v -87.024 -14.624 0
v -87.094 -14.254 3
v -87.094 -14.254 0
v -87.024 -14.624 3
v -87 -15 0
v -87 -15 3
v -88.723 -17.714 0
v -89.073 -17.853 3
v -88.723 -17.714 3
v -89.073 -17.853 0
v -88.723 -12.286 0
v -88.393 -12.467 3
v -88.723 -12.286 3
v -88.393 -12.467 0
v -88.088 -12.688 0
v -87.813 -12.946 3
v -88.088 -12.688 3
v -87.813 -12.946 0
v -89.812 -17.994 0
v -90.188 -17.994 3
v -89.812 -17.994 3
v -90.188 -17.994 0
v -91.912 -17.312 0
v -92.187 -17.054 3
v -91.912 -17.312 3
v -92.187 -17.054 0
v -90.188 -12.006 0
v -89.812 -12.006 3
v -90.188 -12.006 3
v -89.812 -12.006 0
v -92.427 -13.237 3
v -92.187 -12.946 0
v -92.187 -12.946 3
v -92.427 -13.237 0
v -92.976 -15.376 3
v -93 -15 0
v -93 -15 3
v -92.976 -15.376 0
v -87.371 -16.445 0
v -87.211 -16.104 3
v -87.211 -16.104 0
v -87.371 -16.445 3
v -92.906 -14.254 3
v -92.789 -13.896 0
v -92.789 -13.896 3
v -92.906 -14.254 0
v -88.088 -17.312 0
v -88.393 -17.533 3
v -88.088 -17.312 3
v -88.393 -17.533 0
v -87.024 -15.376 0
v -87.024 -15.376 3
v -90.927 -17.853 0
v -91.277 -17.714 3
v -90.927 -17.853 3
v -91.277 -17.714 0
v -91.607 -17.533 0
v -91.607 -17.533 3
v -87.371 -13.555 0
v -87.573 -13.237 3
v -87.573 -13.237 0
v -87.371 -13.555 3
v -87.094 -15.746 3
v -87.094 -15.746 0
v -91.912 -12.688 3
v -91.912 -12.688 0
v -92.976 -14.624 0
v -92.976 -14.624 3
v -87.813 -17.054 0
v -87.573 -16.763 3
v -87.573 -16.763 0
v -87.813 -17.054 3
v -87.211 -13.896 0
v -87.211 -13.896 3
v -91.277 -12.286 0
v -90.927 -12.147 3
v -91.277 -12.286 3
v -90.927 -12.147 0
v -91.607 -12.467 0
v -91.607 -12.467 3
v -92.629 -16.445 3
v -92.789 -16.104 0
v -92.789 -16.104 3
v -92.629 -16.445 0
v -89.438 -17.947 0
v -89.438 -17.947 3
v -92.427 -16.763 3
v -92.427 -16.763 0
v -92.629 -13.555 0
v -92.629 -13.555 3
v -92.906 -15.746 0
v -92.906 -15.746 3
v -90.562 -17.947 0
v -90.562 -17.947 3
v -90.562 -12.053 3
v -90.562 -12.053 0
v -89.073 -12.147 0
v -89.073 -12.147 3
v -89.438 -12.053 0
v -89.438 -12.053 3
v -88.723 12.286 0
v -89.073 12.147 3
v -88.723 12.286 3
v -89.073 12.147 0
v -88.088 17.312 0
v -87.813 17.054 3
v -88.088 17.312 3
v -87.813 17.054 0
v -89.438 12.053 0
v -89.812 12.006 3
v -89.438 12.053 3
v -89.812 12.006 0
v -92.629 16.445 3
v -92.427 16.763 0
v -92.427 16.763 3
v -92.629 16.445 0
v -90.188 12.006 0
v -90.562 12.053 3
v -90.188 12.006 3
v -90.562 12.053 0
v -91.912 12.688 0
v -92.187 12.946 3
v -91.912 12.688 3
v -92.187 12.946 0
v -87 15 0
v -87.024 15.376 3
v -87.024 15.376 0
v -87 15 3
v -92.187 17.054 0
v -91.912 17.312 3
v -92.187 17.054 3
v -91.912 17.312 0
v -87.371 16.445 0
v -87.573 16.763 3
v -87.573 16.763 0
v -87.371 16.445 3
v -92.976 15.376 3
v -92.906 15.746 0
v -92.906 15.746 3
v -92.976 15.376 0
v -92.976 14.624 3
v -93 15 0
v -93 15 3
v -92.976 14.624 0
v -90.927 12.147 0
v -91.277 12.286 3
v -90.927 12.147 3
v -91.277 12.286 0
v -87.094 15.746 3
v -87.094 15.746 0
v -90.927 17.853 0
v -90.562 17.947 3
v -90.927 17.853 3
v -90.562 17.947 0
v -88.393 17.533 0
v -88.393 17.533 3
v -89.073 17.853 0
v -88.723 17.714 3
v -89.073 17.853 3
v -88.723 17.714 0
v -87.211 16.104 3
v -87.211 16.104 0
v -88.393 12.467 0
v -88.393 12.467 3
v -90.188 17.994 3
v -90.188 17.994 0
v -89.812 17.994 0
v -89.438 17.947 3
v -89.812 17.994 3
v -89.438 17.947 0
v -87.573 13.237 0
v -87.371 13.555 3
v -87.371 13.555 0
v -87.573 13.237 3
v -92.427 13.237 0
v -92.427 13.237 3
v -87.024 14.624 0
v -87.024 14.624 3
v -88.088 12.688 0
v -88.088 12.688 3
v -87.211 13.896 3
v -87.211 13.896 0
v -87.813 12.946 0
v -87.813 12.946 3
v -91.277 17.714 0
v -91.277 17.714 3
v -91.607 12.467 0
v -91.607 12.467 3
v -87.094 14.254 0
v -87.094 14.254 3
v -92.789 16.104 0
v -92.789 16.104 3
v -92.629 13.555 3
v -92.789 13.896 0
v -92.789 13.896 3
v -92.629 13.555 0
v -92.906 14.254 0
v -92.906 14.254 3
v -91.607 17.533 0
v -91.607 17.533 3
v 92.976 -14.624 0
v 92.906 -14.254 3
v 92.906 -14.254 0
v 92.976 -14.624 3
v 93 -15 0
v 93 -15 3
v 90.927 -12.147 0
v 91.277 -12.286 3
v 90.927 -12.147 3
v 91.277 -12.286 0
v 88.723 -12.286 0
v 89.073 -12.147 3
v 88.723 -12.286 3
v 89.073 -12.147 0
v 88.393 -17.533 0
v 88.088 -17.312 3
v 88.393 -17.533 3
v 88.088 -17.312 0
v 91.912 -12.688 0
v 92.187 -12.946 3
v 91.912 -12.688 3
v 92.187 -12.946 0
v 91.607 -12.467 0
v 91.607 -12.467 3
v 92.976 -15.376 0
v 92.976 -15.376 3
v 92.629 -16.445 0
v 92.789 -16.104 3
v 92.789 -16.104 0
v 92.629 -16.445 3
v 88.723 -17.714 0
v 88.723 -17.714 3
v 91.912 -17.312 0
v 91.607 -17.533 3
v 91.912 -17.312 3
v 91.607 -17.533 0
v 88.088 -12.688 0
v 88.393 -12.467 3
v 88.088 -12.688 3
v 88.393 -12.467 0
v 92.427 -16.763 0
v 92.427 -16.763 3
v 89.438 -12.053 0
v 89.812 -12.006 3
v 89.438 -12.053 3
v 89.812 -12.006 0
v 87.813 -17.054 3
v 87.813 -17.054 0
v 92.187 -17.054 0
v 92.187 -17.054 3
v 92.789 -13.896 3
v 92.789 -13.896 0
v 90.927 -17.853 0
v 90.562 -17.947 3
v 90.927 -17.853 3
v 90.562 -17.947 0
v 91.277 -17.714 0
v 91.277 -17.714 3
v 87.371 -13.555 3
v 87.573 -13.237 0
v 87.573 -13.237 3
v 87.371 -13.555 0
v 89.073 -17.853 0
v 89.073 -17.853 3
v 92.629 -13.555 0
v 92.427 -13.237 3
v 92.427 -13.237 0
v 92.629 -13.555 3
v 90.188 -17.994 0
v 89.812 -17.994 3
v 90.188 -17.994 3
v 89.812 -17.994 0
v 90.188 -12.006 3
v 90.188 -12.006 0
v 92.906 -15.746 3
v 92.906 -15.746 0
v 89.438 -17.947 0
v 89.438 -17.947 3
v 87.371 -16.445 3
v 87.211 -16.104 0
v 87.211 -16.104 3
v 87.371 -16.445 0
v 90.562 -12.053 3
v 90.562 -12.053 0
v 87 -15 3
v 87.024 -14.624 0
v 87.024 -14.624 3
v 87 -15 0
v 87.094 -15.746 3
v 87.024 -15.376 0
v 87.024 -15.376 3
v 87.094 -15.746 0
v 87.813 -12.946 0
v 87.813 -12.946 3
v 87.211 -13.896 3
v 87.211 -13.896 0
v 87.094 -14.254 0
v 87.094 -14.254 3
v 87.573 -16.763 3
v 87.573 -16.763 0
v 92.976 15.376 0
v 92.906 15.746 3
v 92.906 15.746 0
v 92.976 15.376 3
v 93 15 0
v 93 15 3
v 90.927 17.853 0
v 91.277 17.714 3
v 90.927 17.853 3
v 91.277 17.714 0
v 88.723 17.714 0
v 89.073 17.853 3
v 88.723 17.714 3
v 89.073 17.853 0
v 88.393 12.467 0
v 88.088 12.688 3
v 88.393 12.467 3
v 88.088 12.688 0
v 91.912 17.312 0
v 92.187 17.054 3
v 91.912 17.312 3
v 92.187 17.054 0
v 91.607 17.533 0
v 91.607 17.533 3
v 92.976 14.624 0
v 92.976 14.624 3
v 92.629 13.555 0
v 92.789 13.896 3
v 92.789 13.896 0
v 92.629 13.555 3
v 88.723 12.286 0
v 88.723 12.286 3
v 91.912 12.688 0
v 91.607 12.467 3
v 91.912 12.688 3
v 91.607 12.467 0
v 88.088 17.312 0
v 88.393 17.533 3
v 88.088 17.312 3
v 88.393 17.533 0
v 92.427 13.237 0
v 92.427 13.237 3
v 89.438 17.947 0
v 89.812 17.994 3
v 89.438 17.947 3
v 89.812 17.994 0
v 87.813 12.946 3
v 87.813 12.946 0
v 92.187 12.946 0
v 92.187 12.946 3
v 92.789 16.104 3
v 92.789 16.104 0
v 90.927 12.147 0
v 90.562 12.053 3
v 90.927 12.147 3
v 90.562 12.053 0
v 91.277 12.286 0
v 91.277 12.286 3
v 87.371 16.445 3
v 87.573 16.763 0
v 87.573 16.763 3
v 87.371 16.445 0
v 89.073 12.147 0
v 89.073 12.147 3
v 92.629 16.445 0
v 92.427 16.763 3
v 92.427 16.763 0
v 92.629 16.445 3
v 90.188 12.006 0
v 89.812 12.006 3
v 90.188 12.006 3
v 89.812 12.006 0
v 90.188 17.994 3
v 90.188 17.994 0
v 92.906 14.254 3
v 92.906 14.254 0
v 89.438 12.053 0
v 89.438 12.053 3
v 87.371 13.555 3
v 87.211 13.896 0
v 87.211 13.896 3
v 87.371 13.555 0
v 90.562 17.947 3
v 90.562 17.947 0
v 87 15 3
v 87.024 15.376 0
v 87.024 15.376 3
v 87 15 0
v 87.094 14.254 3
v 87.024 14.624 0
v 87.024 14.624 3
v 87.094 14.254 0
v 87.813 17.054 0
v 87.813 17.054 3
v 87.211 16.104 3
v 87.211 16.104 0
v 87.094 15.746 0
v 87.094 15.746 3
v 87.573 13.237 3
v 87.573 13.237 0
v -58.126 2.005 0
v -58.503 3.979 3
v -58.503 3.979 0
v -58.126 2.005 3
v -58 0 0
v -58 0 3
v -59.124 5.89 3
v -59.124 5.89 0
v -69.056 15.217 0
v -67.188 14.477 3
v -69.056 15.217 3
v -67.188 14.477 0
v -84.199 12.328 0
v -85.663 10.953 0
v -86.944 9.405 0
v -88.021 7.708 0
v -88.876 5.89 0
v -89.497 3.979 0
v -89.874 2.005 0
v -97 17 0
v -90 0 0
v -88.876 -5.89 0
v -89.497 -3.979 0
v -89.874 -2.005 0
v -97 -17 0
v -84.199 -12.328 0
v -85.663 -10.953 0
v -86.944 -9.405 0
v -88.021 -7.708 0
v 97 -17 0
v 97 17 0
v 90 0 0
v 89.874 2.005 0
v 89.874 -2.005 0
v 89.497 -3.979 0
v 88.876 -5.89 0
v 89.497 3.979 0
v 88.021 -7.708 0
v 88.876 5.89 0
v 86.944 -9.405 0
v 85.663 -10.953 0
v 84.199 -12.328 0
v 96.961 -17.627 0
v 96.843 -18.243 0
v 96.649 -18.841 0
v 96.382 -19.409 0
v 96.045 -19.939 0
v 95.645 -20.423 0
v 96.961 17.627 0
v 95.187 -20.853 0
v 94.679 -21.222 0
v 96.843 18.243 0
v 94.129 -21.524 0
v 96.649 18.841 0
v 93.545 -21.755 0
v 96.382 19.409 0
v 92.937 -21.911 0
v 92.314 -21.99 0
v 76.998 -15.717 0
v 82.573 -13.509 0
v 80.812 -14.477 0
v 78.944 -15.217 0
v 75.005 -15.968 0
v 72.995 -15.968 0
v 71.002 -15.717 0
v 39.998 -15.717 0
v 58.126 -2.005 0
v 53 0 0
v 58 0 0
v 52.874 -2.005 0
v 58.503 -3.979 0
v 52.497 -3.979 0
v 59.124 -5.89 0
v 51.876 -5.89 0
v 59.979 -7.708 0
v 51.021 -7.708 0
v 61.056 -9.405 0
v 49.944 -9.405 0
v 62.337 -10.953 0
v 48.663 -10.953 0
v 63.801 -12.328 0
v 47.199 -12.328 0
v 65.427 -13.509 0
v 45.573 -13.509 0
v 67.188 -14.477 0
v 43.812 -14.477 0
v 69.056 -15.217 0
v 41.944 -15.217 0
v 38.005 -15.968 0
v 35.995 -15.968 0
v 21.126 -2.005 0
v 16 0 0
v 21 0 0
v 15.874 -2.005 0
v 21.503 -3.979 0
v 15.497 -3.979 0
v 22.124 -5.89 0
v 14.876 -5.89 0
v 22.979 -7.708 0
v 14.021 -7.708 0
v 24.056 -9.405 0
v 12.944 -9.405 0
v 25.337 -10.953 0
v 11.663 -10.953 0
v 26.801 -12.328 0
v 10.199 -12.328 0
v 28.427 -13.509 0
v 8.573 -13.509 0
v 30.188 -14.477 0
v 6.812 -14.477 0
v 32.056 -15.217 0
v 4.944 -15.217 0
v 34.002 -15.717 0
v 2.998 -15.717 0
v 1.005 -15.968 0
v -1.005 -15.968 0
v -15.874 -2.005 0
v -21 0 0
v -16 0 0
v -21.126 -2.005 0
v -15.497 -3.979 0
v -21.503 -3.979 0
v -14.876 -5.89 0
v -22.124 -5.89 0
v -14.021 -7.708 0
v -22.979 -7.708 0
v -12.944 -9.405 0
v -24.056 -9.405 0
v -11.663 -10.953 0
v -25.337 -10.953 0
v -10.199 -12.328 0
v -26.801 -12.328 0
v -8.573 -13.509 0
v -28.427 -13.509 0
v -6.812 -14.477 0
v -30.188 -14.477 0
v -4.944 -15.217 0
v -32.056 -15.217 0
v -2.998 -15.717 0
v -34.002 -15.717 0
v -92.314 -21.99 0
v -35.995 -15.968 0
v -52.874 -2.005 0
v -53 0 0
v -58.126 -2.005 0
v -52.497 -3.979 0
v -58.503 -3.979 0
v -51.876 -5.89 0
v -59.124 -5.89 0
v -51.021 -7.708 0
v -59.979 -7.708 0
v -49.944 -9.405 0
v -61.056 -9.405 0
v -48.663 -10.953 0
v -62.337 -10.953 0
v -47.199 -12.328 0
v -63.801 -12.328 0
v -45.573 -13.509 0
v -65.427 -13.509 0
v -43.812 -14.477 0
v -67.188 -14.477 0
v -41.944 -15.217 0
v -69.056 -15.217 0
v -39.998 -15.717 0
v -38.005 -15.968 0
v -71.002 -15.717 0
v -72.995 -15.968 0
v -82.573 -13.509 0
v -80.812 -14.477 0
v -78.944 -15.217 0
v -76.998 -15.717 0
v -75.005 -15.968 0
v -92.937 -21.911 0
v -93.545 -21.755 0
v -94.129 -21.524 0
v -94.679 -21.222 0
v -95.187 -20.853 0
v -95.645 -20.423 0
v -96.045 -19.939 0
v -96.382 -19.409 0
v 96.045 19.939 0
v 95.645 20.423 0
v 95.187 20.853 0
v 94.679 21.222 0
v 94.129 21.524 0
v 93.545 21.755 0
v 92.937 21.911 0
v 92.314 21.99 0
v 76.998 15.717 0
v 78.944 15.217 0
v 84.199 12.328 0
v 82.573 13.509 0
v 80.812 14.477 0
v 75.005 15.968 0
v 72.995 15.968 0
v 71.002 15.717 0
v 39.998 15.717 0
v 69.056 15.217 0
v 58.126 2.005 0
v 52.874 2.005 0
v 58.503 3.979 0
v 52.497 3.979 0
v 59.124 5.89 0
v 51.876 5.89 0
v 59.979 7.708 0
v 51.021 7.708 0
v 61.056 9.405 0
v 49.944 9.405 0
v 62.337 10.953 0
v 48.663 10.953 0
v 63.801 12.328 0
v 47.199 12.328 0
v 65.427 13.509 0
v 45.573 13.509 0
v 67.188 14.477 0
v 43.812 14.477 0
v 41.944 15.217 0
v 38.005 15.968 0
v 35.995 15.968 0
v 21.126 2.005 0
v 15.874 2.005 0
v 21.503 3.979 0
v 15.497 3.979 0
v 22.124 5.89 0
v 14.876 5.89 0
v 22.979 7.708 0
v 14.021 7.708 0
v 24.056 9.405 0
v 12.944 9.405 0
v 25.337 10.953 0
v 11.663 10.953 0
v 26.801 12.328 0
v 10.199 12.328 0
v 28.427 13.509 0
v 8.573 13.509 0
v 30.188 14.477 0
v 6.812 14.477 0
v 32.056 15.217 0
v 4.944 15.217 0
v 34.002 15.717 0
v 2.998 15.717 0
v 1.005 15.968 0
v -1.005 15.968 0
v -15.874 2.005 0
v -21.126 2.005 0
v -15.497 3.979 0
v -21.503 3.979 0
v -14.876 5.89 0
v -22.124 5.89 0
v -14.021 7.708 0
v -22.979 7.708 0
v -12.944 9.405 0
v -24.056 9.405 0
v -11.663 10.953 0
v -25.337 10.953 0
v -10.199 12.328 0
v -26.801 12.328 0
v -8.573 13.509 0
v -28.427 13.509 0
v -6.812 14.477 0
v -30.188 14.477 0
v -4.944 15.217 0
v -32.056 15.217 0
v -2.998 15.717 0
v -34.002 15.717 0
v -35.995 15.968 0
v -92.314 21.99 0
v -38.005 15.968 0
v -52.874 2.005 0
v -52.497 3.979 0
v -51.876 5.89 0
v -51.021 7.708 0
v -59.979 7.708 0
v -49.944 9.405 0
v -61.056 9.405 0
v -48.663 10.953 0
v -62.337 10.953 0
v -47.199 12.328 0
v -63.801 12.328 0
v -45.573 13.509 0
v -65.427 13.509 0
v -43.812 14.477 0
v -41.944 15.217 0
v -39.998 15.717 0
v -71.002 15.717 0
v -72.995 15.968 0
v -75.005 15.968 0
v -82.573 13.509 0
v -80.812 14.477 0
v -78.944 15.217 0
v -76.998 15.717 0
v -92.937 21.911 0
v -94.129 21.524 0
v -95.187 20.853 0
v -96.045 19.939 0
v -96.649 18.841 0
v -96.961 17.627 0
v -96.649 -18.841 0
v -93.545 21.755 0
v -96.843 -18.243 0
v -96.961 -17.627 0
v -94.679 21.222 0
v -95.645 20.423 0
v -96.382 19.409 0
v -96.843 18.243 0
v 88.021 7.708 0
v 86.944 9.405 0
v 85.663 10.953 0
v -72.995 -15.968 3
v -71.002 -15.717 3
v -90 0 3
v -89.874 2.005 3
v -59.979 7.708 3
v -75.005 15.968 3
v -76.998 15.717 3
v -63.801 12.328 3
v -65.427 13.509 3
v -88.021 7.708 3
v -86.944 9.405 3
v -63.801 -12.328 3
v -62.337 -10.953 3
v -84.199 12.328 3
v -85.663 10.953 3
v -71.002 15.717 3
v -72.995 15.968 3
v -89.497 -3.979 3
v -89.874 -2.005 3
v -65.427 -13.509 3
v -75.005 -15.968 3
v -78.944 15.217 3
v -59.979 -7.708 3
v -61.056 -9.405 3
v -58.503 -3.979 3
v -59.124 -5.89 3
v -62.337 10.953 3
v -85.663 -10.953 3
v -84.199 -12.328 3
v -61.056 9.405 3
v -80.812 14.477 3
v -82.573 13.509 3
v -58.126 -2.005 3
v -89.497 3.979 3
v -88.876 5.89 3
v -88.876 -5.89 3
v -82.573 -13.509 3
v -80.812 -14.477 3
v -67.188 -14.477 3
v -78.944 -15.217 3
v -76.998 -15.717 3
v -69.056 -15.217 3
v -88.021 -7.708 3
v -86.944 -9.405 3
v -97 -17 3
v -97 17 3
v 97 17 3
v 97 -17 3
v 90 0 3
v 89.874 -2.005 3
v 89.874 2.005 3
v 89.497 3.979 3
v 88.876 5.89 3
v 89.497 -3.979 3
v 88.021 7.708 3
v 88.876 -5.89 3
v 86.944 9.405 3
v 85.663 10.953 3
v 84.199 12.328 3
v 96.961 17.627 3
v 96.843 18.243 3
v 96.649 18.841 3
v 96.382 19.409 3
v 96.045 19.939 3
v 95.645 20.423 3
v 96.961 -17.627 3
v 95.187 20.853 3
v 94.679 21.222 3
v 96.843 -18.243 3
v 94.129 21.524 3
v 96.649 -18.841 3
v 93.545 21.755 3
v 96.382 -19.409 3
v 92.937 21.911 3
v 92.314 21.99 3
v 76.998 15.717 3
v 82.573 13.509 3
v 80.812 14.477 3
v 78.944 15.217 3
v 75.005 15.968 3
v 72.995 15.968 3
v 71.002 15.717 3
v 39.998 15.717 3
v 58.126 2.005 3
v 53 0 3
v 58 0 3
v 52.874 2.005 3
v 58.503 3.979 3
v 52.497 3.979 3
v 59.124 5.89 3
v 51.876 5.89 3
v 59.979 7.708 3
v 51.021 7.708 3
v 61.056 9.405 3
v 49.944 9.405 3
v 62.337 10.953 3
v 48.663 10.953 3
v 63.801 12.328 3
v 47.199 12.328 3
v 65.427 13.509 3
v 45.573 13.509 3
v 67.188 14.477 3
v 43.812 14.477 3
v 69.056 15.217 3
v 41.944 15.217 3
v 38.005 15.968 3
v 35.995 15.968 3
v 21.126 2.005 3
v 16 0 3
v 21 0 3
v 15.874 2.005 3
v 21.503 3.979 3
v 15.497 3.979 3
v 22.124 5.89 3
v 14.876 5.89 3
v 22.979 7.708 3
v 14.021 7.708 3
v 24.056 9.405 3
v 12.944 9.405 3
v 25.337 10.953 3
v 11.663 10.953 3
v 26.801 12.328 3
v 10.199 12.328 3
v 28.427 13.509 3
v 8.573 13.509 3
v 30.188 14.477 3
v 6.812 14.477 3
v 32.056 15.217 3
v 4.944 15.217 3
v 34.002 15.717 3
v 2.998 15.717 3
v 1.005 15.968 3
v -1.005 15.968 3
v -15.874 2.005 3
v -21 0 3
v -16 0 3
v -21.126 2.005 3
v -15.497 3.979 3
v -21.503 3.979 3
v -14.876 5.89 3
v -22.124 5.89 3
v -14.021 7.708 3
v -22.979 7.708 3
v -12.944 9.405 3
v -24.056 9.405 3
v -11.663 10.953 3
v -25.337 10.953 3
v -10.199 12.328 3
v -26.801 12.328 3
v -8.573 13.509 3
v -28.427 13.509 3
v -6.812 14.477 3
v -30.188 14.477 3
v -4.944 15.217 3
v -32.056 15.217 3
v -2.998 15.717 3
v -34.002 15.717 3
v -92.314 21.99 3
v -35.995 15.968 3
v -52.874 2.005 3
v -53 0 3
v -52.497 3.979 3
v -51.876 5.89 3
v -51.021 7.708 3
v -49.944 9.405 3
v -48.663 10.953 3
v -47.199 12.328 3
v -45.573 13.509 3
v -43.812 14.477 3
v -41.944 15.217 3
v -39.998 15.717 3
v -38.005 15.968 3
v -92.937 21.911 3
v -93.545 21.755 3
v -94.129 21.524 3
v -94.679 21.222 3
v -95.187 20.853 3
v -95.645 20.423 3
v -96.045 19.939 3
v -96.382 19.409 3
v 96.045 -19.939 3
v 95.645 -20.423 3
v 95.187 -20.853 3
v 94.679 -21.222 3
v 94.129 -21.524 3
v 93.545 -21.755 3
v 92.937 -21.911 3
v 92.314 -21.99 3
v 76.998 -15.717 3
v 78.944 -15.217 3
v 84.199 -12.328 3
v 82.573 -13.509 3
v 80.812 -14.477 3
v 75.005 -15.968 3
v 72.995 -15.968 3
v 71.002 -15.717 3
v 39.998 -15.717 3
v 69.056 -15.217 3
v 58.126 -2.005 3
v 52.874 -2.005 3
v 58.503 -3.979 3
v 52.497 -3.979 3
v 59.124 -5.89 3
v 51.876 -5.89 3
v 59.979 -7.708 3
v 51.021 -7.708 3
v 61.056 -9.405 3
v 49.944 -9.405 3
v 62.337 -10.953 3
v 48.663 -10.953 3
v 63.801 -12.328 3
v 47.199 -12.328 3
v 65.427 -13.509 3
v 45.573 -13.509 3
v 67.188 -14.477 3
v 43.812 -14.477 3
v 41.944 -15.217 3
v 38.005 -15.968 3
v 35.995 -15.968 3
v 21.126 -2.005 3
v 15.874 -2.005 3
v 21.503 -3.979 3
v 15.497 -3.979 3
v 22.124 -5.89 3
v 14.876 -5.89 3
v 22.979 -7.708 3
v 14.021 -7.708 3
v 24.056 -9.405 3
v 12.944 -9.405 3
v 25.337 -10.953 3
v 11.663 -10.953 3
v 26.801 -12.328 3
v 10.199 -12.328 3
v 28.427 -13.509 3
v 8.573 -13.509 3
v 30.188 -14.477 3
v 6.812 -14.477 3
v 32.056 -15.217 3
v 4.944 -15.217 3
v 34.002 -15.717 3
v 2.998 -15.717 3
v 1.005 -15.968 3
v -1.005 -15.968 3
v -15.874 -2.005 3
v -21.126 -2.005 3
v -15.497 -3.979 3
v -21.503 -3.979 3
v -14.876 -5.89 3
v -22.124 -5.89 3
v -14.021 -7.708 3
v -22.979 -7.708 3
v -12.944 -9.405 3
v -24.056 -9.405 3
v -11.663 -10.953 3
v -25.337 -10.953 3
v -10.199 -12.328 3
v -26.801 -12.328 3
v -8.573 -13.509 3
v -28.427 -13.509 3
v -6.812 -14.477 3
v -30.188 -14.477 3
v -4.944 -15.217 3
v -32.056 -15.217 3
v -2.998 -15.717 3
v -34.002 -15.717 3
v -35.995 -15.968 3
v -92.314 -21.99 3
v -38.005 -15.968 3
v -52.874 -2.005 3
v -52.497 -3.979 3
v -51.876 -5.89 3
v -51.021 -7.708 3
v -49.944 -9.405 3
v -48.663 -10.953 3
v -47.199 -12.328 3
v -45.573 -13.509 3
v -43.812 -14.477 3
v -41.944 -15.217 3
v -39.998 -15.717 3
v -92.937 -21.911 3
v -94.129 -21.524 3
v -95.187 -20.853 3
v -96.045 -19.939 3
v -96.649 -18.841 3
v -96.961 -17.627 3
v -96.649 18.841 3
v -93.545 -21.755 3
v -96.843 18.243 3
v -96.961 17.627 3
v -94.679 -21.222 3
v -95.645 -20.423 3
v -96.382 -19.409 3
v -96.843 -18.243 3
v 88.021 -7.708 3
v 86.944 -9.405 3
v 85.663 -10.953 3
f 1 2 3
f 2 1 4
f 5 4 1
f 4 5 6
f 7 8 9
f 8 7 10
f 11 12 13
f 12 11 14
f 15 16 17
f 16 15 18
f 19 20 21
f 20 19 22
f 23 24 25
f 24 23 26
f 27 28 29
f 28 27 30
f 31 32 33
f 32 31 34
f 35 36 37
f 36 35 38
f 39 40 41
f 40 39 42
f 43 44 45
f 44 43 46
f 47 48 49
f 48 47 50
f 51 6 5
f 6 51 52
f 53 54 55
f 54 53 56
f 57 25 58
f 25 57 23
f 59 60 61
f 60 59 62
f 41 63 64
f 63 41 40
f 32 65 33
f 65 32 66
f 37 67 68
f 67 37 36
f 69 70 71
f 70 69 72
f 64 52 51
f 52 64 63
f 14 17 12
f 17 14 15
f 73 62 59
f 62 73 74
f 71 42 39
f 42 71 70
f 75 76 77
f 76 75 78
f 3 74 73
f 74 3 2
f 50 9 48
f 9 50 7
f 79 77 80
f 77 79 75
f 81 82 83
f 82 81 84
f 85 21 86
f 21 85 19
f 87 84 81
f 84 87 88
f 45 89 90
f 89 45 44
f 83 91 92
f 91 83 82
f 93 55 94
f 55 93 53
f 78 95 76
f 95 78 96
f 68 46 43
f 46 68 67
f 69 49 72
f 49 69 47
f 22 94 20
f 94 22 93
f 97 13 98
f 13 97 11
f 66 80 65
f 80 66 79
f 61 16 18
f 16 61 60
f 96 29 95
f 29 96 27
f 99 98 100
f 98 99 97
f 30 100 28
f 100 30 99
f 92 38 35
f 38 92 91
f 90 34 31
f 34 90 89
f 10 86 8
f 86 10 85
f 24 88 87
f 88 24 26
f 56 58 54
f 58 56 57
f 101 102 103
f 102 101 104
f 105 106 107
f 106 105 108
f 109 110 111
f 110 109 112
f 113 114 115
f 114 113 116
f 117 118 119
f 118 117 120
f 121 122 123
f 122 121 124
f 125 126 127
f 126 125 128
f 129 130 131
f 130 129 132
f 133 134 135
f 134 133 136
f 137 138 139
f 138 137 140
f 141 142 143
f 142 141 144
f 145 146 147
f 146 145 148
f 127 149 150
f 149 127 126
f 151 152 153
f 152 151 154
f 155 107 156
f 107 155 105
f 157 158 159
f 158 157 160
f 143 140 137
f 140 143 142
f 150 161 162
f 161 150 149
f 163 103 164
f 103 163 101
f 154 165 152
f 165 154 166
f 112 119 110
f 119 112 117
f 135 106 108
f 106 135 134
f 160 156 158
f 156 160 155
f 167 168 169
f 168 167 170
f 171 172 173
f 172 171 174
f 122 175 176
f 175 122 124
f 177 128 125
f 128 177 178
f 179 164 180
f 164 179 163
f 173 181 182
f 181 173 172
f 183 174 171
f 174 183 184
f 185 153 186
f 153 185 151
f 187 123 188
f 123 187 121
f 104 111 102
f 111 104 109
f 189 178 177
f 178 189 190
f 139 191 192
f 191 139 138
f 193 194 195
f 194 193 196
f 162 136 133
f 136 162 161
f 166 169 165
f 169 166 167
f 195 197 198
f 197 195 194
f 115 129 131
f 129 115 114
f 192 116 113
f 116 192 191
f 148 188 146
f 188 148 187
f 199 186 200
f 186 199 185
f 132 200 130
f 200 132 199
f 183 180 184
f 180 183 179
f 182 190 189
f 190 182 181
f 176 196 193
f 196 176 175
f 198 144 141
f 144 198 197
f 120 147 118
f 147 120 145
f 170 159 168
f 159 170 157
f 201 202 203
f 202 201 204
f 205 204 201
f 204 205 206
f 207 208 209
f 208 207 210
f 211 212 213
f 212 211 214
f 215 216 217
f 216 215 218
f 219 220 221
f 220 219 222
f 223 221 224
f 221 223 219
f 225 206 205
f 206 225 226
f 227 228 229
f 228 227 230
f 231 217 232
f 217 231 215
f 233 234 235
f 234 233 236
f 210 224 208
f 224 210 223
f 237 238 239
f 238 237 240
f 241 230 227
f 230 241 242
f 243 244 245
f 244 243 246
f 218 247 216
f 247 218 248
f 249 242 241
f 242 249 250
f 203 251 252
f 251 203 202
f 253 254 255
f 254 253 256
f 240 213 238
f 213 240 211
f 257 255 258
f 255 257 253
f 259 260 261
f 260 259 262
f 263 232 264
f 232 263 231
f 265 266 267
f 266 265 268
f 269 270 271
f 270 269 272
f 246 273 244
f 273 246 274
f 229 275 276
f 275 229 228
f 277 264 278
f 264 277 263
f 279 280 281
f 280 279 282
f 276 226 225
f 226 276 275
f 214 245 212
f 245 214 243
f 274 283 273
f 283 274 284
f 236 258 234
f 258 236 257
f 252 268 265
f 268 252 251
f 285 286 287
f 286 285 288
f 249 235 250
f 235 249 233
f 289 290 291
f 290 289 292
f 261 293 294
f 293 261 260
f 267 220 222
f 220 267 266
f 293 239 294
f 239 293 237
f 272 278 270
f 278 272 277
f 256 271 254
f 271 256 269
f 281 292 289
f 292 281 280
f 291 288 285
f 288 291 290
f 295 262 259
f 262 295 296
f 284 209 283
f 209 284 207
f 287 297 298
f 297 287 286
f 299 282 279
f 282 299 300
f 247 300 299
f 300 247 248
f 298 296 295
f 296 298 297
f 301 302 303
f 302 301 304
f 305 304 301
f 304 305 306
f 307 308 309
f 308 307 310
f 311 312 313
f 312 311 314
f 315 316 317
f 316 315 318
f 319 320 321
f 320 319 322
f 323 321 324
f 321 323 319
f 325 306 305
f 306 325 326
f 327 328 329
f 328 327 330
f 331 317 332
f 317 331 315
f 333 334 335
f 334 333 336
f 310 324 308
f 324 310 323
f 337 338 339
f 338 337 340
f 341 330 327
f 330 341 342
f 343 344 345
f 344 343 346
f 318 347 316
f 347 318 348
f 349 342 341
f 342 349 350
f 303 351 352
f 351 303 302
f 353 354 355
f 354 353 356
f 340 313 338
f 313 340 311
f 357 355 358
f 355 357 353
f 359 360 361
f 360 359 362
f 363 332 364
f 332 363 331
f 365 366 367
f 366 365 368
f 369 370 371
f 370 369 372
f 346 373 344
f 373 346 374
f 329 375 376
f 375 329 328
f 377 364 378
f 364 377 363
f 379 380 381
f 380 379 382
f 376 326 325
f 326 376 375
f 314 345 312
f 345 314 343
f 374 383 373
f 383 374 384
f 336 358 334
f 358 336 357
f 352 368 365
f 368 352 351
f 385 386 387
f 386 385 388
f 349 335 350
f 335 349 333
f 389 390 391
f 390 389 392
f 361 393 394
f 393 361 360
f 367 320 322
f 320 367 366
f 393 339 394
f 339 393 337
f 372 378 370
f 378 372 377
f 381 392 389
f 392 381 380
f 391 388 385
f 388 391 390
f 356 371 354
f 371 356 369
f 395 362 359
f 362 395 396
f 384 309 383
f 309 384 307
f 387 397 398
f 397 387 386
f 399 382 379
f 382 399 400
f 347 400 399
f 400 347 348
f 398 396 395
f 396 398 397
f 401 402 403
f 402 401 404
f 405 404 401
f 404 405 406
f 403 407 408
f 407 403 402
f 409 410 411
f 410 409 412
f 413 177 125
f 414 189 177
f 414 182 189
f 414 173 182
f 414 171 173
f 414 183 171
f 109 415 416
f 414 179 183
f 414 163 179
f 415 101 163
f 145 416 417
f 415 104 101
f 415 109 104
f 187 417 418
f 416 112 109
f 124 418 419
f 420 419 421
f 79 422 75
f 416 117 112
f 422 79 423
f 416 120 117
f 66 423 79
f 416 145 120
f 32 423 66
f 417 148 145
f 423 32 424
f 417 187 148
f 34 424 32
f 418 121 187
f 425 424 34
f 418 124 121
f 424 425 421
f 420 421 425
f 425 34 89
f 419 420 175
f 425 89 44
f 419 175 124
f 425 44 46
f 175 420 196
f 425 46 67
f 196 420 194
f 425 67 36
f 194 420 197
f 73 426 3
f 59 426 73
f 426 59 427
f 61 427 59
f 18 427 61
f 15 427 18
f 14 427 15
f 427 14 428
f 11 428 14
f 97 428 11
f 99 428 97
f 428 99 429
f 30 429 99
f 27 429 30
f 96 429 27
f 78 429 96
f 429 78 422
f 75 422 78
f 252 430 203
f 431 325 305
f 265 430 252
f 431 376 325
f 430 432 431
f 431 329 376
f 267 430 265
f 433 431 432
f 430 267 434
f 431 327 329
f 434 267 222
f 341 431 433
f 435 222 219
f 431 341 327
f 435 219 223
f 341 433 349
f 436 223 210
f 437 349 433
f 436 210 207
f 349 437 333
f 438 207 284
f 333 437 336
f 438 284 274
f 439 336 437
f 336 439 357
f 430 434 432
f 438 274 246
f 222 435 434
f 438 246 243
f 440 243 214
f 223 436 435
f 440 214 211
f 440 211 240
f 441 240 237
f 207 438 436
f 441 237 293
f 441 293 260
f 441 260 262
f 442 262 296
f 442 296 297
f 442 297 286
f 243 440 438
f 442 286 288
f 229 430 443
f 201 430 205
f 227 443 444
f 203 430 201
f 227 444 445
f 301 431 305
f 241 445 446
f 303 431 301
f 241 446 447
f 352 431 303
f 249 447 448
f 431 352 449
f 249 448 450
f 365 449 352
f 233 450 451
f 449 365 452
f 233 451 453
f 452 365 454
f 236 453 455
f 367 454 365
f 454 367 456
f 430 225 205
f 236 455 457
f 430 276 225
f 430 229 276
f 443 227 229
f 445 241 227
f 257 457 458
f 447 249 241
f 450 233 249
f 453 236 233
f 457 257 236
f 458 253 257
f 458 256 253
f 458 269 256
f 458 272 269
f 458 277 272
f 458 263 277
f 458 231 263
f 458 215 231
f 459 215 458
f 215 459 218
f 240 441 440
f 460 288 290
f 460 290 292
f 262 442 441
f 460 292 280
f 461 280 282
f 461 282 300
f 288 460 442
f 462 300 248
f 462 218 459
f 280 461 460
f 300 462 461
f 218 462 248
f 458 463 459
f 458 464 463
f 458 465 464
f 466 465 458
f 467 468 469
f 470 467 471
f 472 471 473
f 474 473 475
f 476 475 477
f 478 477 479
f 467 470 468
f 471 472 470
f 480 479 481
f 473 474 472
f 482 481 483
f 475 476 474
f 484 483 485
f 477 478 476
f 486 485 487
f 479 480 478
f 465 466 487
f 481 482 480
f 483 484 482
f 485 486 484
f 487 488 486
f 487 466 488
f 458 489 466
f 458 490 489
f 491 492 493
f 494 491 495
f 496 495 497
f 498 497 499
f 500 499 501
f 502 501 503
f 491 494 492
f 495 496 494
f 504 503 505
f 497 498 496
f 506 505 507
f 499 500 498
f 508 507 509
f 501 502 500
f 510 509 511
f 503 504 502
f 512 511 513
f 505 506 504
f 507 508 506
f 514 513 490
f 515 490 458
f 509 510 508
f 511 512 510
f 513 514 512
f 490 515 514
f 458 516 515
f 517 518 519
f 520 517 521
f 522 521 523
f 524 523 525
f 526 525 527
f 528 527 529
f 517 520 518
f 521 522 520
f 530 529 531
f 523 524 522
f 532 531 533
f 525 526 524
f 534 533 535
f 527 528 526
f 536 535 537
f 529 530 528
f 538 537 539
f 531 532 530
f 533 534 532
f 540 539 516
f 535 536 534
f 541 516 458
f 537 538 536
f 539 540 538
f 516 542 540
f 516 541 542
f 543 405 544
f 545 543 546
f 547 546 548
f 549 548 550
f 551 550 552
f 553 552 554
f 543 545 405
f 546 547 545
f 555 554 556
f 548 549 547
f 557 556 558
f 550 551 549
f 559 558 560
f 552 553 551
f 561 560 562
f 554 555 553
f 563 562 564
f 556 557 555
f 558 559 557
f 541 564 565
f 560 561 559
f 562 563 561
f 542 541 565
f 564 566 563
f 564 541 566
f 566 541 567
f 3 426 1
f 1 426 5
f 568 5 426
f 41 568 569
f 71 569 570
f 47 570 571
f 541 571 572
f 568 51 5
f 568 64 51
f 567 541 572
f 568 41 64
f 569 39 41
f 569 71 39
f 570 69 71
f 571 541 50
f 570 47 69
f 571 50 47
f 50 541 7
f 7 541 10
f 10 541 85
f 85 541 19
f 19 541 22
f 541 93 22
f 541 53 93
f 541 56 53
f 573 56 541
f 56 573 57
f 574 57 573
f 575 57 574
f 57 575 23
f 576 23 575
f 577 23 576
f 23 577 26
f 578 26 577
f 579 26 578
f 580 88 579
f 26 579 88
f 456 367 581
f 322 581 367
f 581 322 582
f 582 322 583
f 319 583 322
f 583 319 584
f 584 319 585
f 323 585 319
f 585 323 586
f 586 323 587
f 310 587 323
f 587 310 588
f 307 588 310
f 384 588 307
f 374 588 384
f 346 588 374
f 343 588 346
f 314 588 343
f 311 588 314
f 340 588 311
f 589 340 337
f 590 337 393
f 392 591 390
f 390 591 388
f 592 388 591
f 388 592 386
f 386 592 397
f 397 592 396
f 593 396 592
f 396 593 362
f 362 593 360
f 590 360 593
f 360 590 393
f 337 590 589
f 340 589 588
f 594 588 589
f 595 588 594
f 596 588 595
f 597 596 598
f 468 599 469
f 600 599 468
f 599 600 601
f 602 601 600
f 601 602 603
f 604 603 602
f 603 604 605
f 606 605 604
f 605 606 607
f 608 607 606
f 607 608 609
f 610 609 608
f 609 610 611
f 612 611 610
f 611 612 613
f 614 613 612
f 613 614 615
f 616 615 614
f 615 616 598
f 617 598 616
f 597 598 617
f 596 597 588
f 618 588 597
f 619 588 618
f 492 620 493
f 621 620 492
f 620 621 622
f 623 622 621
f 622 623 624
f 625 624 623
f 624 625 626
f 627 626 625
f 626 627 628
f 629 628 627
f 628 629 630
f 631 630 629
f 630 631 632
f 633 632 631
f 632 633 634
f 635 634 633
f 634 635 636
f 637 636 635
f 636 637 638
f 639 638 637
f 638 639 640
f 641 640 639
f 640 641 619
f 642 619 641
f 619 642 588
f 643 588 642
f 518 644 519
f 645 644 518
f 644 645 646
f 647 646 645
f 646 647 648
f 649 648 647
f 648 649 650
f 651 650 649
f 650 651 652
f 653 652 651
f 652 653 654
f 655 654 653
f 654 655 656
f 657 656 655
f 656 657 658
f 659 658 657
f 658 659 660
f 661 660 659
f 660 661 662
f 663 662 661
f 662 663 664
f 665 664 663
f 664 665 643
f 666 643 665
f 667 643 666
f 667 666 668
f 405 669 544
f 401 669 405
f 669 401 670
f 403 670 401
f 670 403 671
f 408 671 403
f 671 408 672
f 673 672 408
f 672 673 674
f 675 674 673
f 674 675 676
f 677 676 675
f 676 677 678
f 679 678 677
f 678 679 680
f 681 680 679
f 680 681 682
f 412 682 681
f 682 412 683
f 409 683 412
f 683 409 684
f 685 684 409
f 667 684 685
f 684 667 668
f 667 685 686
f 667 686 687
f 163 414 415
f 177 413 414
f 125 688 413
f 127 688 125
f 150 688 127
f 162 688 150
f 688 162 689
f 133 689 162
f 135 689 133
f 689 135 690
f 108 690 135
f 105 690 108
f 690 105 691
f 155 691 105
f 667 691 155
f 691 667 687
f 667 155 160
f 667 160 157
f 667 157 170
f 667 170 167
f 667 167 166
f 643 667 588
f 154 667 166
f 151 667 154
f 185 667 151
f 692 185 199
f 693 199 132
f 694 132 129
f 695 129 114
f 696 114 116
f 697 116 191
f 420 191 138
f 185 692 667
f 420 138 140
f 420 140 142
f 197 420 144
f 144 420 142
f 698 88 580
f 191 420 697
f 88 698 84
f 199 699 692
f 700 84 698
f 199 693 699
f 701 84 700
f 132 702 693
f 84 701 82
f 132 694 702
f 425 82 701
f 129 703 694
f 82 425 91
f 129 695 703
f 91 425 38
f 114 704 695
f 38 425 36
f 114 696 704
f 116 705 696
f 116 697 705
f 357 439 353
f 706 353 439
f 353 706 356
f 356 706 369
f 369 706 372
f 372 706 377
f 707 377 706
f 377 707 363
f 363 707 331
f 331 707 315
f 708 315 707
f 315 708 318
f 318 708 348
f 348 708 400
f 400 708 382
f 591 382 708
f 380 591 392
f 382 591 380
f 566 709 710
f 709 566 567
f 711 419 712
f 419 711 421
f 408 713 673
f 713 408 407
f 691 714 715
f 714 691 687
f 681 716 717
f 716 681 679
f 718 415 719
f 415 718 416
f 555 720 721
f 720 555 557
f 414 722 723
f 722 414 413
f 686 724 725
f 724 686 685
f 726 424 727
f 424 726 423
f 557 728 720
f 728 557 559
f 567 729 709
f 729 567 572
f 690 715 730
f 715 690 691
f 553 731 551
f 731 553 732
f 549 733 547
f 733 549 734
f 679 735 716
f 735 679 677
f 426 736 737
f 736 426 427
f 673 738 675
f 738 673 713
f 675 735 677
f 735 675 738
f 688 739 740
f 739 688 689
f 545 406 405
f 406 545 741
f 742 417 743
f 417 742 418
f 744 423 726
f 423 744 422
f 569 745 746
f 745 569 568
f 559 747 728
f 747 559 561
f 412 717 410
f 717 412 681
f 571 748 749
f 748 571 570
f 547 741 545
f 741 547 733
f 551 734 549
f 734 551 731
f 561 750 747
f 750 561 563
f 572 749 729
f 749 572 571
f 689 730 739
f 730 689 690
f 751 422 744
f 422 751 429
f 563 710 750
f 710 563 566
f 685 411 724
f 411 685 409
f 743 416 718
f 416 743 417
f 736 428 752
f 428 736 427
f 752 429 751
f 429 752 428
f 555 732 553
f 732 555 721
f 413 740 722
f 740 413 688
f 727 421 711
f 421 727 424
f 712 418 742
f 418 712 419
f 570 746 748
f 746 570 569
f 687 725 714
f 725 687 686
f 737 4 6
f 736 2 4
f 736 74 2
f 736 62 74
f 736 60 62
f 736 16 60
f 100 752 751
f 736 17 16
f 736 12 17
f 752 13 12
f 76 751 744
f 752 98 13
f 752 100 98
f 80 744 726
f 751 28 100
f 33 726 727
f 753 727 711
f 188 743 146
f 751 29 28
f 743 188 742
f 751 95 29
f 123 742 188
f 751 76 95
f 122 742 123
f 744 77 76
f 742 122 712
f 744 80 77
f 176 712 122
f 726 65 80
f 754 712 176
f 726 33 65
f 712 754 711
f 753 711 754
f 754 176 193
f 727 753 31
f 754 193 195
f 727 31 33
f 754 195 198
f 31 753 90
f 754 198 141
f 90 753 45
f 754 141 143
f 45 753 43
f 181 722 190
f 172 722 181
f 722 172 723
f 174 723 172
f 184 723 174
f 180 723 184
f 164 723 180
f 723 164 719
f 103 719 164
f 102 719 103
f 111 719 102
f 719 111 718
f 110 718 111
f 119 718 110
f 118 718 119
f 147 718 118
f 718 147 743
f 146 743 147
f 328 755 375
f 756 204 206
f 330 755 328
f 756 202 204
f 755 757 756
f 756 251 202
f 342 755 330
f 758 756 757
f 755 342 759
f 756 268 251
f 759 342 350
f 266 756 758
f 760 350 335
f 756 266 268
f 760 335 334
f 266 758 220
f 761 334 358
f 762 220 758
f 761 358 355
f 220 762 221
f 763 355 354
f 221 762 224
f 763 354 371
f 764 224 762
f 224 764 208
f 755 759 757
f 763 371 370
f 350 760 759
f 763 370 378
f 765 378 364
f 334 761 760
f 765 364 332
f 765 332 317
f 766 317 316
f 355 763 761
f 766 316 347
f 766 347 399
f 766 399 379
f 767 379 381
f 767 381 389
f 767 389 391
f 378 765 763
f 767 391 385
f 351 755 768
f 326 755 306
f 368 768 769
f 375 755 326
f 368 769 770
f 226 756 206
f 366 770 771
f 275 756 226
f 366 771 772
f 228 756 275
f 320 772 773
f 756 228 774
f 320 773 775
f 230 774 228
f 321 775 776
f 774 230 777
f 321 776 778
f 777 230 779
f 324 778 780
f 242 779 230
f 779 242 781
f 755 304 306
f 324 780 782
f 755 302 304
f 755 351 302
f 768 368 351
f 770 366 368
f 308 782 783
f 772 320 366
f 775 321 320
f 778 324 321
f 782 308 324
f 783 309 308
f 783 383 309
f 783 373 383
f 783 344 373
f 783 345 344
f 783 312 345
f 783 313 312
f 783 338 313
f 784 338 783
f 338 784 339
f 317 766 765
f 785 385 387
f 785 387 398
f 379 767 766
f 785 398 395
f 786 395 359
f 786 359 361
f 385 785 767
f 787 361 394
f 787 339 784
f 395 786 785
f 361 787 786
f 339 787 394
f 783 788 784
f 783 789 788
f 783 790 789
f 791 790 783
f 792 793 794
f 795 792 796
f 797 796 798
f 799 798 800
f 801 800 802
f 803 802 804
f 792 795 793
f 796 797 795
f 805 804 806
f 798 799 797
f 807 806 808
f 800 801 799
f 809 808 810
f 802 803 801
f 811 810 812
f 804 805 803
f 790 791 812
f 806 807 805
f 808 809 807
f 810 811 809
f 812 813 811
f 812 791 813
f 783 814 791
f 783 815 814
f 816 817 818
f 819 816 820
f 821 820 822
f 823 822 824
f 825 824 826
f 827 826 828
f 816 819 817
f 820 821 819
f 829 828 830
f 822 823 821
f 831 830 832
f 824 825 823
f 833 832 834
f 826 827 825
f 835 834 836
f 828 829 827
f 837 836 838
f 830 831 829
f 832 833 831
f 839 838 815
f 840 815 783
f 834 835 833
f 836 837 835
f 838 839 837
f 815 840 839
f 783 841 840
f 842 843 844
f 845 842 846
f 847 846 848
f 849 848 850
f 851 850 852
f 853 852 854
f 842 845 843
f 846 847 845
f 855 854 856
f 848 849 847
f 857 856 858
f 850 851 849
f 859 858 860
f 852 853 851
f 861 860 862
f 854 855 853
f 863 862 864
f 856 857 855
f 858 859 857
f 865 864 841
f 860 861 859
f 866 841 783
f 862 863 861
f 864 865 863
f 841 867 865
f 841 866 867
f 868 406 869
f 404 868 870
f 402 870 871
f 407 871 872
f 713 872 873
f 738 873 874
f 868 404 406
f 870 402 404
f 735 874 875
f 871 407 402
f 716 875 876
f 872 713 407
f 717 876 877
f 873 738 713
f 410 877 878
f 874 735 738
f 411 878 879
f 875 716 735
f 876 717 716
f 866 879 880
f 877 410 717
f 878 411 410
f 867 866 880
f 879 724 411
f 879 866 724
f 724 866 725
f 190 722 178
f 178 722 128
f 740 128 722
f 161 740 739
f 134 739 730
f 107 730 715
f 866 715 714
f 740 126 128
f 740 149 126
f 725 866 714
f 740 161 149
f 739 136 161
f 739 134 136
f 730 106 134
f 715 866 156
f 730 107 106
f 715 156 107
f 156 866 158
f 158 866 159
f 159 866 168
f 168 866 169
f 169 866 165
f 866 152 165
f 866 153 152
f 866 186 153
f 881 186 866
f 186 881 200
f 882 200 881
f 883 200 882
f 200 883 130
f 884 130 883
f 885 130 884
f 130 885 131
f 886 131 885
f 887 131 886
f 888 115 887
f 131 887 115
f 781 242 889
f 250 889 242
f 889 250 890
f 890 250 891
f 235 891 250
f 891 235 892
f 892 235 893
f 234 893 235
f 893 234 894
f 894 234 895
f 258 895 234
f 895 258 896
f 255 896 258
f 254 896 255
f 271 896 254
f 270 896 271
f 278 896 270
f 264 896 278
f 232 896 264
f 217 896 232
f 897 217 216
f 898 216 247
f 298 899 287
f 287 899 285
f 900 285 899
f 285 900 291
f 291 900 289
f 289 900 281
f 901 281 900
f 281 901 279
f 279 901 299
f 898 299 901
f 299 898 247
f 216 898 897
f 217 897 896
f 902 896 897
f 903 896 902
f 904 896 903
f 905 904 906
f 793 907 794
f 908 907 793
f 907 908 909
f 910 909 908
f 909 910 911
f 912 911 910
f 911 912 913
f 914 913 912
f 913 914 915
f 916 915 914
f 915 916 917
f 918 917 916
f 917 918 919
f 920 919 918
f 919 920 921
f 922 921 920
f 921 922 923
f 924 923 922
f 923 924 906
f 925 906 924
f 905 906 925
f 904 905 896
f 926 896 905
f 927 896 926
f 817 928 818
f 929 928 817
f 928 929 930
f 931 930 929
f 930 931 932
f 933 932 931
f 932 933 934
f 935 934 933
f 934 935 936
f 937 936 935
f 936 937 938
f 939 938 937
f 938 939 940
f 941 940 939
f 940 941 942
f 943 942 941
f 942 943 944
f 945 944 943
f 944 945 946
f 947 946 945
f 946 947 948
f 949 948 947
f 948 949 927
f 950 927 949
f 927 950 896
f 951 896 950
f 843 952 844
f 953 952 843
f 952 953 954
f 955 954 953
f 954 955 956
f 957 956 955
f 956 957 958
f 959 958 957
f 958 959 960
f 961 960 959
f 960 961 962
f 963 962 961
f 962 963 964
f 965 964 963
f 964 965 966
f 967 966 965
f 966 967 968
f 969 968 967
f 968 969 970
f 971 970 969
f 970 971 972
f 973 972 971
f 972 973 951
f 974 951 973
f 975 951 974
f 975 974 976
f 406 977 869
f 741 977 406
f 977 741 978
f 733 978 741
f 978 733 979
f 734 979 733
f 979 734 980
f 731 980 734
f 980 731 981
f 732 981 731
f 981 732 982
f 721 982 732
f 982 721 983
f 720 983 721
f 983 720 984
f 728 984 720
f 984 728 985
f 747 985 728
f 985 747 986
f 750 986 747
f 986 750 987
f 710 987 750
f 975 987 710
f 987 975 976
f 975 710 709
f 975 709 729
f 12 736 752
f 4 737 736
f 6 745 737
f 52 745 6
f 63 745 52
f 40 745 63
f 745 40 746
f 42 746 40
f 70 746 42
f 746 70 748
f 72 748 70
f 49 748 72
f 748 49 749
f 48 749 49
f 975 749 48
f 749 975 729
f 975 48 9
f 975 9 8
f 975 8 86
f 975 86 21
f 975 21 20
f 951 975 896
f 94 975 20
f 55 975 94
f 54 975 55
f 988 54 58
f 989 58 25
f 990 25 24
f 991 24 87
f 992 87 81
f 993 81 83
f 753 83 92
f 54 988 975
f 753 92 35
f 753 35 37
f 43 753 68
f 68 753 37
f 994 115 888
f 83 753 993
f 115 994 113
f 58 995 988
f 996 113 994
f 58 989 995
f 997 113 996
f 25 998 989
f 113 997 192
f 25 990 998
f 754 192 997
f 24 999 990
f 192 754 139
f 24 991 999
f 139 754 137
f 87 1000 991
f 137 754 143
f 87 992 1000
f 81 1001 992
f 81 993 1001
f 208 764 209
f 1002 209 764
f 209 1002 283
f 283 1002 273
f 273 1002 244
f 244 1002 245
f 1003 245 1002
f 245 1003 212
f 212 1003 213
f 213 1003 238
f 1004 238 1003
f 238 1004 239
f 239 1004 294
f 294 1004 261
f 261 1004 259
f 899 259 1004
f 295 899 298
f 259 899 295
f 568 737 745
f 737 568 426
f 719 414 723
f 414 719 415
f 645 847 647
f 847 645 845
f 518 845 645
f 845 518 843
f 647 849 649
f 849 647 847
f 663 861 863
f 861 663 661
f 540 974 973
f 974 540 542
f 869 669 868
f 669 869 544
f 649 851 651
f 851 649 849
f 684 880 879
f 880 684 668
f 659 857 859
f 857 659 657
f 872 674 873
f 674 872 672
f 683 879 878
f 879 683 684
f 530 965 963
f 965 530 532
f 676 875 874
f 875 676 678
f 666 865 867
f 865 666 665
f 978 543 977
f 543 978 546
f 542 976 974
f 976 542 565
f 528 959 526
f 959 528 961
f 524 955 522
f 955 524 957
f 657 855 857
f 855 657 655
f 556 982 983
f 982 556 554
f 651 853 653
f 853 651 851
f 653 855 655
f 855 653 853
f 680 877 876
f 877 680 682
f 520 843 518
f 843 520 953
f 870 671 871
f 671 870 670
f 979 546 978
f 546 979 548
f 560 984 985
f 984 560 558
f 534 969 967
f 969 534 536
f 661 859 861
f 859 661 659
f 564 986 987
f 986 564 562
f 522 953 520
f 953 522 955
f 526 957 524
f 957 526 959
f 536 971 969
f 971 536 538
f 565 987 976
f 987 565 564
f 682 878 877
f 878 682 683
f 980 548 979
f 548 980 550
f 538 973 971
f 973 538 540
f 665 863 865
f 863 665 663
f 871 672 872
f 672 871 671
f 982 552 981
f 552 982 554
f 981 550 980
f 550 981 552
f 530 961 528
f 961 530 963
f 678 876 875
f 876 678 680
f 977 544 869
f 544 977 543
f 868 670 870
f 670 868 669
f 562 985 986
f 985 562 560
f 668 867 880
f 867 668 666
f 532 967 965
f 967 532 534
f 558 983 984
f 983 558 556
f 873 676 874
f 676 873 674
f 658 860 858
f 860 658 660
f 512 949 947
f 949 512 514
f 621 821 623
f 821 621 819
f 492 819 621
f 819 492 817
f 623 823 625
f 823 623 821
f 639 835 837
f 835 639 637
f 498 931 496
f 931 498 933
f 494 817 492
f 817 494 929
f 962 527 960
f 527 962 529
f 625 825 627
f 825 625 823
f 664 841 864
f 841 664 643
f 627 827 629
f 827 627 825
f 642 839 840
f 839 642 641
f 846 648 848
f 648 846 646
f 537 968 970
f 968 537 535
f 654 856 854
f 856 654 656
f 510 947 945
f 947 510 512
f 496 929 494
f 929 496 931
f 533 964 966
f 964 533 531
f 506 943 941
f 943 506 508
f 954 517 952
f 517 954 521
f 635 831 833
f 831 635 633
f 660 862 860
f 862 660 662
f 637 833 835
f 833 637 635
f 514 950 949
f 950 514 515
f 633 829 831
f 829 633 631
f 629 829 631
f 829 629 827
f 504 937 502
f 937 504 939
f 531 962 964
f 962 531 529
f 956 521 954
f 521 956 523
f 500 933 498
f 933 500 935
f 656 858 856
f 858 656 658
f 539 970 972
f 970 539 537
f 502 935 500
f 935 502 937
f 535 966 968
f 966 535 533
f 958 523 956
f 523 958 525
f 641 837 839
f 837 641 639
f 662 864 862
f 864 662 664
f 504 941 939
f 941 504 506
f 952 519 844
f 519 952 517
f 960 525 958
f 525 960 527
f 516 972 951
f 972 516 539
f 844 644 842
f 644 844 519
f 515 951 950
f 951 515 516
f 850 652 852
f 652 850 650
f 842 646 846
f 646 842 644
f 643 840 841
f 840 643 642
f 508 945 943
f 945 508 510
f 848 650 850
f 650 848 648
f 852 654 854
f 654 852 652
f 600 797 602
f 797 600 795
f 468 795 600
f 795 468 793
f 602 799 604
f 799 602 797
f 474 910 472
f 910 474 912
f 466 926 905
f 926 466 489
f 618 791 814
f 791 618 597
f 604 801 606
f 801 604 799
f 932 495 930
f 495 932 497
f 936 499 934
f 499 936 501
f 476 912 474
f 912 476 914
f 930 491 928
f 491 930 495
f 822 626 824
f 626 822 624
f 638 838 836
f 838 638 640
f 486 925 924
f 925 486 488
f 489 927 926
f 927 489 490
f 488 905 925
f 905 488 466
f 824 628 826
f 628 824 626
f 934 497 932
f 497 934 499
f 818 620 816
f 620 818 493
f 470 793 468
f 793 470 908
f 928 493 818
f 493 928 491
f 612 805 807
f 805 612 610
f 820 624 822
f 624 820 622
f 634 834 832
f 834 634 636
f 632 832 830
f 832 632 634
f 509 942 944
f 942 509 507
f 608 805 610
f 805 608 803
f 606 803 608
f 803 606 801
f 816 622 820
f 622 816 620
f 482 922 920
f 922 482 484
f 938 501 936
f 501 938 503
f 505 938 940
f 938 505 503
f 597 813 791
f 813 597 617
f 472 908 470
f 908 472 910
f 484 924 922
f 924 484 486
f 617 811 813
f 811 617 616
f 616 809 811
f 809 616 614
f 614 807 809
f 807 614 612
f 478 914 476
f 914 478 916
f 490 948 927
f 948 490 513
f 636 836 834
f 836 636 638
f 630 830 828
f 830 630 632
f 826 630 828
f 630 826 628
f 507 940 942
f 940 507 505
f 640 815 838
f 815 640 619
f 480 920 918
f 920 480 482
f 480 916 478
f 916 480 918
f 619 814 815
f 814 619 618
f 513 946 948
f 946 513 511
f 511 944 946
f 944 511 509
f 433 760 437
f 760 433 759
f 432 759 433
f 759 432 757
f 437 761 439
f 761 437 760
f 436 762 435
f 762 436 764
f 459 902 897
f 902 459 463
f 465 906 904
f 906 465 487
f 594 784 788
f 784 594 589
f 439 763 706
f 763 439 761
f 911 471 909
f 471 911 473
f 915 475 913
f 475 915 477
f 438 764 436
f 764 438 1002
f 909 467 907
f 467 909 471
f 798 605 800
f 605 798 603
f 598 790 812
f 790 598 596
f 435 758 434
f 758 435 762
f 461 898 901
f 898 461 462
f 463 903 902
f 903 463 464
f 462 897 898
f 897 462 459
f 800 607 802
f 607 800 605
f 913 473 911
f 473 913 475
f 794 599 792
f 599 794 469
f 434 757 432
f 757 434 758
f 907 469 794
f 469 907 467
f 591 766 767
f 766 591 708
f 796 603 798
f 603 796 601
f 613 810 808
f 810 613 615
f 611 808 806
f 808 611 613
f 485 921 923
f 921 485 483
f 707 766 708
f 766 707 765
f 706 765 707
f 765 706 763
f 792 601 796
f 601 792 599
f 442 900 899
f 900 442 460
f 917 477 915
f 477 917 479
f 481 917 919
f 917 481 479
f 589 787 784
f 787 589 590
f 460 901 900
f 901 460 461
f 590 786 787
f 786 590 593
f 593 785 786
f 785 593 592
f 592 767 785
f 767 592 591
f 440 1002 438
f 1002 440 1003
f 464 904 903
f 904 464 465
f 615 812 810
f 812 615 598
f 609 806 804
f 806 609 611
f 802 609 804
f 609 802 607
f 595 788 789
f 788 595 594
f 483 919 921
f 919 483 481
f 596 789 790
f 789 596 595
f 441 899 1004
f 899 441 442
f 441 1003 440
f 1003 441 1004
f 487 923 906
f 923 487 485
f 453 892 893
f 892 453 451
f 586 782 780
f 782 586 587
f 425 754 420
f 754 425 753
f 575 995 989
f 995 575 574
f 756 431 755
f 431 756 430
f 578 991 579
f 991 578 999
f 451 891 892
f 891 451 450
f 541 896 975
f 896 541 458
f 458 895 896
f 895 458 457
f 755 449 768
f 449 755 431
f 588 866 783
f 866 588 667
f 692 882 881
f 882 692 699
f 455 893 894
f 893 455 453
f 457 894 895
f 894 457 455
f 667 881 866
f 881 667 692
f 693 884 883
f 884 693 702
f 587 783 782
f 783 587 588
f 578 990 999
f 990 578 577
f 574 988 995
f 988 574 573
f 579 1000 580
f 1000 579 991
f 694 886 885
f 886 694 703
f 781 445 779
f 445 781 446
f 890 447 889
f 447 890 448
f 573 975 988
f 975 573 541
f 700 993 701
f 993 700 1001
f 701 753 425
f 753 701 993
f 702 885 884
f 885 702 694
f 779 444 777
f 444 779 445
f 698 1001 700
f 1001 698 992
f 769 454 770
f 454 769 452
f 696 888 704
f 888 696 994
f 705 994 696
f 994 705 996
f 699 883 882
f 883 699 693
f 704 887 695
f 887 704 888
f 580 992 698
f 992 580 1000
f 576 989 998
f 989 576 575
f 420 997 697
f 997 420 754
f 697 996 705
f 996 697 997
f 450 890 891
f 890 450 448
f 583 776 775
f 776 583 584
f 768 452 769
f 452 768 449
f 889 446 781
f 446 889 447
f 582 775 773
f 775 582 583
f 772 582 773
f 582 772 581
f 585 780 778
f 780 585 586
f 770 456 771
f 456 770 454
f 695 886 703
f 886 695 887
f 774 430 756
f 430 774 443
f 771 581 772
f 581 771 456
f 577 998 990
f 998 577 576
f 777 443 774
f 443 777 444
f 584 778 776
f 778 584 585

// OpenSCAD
$fn = 50;


difference() {
	union() {
		hull() {
			translate(v = [-92.0000000000, 17.0000000000, 0]) {
				cylinder(h = 3, r = 5);
			}
			translate(v = [92.0000000000, 17.0000000000, 0]) {
				cylinder(h = 3, r = 5);
			}
			translate(v = [-92.0000000000, -17.0000000000, 0]) {
				cylinder(h = 3, r = 5);
			}
			translate(v = [92.0000000000, -17.0000000000, 0]) {
				cylinder(h = 3, r = 5);
			}
		}
	}
	union() {
		#translate(v = [-90.0000000000, -15.0000000000, -100.0000000000]) {
			cylinder(h = 200, r = 3.0000000000);
		}
		#translate(v = [-90.0000000000, 15.0000000000, -100.0000000000]) {
			cylinder(h = 200, r = 3.0000000000);
		}
		#translate(v = [90.0000000000, -15.0000000000, -100.0000000000]) {
			cylinder(h = 200, r = 3.0000000000);
		}
		#translate(v = [90.0000000000, 15.0000000000, -100.0000000000]) {
			cylinder(h = 200, r = 3.0000000000);
		}
		#translate(v = [-74.0000000000, 0, 0]) {
			cylinder(h = 3, r = 16.0000000000);
		}
		#translate(v = [-37.0000000000, 0, 0]) {
			cylinder(h = 3, r = 16.0000000000);
		}
		#cylinder(h = 3, r = 16.0000000000);
		#translate(v = [37.0000000000, 0, 0]) {
			cylinder(h = 3, r = 16.0000000000);
		}
		#translate(v = [74.0000000000, 0, 0]) {
			cylinder(h = 3, r = 16.0000000000);
		}
	}
}
